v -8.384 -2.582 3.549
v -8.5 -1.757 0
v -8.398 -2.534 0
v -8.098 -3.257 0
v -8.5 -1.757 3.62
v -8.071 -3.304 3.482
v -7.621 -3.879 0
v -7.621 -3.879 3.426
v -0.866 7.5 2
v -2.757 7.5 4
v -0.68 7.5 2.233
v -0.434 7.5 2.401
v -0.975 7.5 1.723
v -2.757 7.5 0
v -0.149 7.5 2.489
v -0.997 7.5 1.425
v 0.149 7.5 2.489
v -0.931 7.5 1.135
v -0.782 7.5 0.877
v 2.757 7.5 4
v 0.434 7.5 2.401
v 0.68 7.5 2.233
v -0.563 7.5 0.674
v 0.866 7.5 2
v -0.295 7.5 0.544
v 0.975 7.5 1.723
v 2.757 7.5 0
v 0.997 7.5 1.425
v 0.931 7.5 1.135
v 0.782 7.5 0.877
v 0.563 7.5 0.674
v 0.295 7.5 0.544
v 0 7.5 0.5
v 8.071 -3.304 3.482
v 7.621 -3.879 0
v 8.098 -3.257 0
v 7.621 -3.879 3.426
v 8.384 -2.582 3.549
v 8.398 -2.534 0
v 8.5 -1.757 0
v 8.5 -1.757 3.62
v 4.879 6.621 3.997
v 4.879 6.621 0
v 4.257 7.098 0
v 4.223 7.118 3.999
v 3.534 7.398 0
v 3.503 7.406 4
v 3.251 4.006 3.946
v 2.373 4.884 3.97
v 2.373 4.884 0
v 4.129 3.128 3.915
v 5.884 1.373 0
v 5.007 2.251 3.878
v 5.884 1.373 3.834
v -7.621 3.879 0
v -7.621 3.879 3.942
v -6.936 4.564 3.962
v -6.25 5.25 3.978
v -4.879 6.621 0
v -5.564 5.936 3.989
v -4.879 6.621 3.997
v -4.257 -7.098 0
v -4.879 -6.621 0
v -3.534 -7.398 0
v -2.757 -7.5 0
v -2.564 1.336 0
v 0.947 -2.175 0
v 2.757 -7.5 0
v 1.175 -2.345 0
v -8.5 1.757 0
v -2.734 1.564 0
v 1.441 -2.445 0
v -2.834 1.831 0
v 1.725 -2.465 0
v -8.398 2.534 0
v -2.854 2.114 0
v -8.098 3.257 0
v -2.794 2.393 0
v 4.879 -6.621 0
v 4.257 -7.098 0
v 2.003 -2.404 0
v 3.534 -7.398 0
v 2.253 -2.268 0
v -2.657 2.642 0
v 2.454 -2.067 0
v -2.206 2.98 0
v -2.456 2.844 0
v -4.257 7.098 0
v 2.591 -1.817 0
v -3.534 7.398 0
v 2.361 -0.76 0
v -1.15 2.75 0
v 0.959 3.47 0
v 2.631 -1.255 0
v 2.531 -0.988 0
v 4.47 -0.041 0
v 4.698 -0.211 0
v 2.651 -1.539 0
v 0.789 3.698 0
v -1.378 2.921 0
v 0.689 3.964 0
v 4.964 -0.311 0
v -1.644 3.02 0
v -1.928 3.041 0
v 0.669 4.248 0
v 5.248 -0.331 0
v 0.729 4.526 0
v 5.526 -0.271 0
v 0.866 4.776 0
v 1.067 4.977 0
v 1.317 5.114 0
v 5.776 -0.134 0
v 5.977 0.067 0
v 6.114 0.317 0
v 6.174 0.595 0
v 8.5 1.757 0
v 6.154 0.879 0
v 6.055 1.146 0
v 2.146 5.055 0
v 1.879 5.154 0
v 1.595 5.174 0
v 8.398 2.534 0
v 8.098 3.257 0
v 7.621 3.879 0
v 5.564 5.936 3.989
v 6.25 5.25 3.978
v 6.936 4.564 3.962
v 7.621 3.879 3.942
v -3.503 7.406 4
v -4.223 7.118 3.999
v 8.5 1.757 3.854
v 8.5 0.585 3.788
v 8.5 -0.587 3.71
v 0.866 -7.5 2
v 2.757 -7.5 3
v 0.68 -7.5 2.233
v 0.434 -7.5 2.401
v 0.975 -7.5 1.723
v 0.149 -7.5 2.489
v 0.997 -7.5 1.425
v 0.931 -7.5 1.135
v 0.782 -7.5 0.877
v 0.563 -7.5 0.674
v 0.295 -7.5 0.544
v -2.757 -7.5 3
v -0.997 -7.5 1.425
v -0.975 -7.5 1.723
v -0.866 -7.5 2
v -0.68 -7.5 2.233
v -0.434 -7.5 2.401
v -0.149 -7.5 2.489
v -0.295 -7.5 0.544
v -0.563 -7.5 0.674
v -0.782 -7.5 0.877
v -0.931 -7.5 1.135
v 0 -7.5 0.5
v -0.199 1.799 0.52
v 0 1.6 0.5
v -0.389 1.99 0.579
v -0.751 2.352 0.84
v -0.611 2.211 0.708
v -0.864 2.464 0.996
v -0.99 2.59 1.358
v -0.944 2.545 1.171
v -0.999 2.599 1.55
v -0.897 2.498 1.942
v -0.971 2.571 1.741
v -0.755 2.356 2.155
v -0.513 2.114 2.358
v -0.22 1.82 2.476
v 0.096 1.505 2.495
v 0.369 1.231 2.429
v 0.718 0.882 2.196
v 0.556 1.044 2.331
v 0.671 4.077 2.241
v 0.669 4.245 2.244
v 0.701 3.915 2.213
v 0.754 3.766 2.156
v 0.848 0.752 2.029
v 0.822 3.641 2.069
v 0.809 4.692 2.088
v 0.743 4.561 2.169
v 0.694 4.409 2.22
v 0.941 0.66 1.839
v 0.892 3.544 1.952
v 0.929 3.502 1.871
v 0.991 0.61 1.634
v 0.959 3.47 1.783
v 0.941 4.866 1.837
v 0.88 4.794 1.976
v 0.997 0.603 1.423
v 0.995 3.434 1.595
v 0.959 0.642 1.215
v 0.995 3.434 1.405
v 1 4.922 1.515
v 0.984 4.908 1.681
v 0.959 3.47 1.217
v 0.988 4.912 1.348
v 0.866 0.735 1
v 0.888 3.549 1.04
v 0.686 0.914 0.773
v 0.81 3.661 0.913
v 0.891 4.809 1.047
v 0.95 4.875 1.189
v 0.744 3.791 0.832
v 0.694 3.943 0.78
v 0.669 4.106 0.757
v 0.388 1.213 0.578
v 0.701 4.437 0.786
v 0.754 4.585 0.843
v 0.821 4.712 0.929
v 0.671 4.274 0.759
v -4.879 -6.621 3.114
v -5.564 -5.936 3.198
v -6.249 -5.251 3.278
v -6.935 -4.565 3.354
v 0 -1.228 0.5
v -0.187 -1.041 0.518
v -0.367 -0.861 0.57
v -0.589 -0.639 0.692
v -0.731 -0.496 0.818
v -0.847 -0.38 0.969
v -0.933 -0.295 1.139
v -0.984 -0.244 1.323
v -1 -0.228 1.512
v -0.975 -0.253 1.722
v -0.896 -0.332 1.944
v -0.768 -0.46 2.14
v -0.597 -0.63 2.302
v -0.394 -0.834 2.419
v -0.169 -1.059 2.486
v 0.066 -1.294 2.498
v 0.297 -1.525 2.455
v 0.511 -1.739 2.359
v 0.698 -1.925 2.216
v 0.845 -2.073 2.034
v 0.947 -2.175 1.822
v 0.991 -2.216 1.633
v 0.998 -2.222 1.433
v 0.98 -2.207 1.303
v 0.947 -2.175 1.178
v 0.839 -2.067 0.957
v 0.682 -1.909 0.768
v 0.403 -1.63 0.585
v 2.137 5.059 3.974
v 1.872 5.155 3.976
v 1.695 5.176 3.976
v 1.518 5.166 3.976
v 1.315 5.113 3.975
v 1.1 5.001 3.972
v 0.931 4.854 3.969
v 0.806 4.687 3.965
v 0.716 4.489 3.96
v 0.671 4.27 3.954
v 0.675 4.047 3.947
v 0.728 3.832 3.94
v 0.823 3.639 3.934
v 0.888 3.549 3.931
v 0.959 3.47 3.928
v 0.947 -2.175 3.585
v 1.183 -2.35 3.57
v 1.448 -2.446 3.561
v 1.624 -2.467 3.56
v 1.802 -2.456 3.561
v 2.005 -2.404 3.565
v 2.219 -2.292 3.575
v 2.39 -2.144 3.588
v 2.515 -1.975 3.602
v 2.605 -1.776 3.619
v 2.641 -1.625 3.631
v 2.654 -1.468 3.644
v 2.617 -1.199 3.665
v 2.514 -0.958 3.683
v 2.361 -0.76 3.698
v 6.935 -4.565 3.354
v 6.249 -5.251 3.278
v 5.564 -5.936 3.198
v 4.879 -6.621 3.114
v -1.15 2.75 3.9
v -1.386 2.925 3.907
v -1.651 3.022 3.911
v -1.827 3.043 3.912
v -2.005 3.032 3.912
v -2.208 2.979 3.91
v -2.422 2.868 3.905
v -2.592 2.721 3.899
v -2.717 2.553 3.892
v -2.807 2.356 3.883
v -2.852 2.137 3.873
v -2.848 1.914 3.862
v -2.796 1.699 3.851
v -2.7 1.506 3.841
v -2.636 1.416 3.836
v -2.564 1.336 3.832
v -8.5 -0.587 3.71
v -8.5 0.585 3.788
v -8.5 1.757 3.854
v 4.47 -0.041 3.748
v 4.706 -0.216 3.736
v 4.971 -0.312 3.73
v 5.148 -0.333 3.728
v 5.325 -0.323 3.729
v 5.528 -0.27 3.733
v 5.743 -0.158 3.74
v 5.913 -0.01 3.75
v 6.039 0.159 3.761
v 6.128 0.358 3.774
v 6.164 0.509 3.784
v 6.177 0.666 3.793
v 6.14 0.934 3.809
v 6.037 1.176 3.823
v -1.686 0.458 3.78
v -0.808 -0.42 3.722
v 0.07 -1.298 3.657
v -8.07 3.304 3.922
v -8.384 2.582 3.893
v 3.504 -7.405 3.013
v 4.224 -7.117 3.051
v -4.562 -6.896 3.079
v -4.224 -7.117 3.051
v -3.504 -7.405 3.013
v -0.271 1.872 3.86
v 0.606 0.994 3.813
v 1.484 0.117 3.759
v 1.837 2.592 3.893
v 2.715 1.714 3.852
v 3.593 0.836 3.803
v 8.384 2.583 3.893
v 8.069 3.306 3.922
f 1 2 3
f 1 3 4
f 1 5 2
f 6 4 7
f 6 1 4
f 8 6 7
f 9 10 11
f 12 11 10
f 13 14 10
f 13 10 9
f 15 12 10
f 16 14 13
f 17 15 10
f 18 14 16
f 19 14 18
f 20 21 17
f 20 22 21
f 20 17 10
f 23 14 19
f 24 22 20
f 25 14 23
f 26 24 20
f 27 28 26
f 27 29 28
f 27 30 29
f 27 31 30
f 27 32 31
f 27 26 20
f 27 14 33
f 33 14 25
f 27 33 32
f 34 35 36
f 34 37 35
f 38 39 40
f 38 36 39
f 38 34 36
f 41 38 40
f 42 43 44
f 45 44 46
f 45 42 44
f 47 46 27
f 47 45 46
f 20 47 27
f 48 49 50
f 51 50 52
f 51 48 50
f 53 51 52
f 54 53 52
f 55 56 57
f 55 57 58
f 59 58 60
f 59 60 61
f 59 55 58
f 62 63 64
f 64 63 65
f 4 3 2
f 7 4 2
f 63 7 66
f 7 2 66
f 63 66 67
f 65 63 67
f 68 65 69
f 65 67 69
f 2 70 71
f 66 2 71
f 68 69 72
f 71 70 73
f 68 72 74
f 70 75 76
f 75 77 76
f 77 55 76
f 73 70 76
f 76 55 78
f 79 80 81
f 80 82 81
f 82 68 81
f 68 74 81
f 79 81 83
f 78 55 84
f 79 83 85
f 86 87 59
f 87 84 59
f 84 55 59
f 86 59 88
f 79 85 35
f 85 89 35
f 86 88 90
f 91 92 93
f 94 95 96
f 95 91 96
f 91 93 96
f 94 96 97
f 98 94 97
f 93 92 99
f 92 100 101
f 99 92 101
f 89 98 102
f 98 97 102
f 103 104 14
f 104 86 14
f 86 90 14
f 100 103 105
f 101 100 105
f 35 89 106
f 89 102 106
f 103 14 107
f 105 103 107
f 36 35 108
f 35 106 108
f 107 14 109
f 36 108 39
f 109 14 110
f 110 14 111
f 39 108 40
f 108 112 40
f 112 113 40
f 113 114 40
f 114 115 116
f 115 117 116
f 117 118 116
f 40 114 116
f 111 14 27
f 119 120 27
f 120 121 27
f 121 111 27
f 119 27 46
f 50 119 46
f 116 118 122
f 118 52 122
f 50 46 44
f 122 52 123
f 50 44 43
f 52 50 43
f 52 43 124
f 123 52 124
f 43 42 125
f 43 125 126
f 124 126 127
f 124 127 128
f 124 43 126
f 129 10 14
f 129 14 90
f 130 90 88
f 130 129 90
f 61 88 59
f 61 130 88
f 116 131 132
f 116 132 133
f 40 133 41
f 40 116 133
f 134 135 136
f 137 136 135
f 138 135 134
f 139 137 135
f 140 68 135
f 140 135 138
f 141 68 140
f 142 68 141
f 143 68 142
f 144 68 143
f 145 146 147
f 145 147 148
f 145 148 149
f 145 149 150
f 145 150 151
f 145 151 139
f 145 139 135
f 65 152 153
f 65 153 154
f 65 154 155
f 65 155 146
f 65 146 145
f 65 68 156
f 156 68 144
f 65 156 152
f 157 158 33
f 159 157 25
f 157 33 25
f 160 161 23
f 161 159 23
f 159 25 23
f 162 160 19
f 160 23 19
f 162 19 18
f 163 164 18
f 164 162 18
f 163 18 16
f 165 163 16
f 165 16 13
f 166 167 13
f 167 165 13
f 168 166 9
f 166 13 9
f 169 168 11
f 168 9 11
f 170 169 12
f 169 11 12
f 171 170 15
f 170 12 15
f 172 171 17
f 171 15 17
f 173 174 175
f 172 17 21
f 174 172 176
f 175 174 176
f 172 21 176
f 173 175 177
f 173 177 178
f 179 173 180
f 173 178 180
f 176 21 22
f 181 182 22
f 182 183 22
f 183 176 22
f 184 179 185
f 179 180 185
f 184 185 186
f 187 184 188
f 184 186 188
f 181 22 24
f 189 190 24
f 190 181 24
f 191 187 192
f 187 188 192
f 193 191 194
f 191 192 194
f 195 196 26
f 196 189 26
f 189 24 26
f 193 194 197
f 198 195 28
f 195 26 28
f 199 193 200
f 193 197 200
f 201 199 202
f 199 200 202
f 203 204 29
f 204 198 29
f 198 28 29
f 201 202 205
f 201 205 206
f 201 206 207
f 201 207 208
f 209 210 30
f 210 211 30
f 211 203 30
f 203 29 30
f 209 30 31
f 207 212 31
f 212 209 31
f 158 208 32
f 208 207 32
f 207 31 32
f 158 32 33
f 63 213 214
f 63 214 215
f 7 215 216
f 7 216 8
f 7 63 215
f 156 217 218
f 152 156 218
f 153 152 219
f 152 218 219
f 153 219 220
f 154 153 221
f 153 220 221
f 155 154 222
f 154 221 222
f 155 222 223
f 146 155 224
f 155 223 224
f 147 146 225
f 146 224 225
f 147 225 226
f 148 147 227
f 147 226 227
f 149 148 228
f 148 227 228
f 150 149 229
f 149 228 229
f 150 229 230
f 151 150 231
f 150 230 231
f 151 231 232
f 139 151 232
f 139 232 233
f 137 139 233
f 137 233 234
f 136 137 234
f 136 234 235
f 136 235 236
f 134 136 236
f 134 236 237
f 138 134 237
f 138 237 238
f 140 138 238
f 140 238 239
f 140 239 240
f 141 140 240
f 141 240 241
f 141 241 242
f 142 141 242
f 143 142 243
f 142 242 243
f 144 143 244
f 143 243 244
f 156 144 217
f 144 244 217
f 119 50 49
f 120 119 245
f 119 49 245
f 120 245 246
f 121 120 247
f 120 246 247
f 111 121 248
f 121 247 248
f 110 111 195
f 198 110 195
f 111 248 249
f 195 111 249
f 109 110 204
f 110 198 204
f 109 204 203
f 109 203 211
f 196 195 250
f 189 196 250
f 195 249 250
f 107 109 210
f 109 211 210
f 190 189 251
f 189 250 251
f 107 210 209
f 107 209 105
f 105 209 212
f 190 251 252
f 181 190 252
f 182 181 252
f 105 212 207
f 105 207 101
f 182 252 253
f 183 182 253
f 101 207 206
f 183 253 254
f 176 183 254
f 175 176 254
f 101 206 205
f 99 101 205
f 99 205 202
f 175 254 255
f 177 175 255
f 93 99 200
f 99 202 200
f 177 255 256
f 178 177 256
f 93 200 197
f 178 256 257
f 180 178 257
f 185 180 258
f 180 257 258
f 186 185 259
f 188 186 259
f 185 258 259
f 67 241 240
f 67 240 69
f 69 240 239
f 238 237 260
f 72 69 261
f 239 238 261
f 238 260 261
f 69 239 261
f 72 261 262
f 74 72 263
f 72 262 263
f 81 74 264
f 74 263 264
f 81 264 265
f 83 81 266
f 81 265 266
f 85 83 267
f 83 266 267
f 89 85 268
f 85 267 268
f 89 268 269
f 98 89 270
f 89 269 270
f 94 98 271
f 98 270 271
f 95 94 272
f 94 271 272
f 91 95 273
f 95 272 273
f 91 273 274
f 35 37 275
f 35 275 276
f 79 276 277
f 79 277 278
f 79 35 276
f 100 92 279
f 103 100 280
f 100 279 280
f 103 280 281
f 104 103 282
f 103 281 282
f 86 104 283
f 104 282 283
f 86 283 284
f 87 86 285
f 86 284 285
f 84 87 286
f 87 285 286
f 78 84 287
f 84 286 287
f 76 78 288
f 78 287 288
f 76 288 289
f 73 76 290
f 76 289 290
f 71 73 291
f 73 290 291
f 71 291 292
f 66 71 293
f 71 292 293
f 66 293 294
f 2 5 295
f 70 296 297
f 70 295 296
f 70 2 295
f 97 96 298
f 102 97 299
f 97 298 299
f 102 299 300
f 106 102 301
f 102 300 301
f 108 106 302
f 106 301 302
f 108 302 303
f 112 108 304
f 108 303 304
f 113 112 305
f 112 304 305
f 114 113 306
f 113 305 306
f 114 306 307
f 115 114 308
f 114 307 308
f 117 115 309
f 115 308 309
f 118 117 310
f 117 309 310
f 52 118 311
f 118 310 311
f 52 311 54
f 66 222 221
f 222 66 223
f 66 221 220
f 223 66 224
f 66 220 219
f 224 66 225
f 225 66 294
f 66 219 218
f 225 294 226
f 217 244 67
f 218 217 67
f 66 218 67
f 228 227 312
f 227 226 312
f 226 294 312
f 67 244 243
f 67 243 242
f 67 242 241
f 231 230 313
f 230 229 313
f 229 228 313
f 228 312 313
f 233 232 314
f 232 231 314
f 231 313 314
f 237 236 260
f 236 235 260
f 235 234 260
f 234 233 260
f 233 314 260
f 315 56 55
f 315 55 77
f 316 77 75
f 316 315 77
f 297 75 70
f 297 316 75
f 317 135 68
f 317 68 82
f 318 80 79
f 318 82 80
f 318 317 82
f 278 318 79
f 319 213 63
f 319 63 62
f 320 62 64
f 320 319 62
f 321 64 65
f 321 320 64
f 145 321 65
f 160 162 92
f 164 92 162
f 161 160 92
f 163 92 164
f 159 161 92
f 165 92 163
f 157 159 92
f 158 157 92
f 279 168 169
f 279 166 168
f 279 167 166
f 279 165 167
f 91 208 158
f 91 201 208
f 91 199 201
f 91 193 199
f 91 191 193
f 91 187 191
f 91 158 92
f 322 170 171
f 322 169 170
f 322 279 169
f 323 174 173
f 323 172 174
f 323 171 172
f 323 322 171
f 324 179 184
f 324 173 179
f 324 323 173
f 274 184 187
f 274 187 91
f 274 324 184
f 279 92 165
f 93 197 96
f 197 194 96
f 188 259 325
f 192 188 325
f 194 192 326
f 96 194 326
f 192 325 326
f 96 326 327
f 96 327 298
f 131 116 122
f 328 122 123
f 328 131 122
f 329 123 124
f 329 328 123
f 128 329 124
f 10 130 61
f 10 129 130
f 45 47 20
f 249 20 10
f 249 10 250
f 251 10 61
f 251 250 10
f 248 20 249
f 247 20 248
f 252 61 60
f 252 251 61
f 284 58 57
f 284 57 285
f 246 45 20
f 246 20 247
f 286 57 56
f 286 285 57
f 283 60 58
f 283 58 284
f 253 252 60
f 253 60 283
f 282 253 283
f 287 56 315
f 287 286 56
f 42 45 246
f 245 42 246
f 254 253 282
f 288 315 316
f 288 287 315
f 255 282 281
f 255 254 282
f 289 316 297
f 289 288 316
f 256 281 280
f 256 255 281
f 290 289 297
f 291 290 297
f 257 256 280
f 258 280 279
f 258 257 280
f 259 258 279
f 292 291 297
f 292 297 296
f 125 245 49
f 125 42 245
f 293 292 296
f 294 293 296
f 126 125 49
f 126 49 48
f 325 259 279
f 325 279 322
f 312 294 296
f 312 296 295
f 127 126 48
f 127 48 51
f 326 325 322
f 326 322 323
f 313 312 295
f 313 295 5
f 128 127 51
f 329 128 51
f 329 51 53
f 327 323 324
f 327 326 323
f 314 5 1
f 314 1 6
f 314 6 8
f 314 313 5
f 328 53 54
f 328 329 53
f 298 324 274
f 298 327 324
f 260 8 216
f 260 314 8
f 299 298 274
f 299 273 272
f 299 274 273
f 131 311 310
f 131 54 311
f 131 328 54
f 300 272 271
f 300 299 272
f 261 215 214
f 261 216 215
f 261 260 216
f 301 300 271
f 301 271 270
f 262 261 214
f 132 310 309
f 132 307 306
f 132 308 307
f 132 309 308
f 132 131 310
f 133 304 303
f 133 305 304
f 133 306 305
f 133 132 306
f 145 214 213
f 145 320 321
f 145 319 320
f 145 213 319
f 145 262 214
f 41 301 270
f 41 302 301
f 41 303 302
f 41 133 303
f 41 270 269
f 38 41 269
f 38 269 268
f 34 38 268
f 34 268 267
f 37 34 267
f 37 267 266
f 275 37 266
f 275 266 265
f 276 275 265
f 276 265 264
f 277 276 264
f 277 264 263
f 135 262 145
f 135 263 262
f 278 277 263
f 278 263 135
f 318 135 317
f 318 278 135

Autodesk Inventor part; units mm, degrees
ref_plane "YZ Plane" through (0, 0, 0) normal (1, 0, 0) x (0, 1, 0)
ref_plane "XZ Plane" through (0, 0, 0) normal (0, 1, 0) x (-1, 0, 0)
ref_plane "XY Plane" through (0, 0, 0) normal (0, 0, 1) x (1, 0, 0)
sketch "Base" plane through (0, 0, 0) normal (0, 0, 1) x (1, 0, 0)
  line L0 (-8.5, -3) -> (-8.5, 3)
  line L1 (-8.5, 3) -> (-4, 7.5)
  line L2 (-4, 7.5) -> (4, 7.5)
  line L3 (4, 7.5) -> (8.5, 3)
  line L4 (8.5, 3) -> (8.5, -3)
  line L5 (8.5, -3) -> (4, -7.5)
  line L6 (4, -7.5) -> (-4, -7.5)
  line L7 (-4, -7.5) -> (-8.5, -3)
  line L8 (-8.5, 0) -> (8.5, 0) construction
  line L9 (0, 7.5) -> (0, -7.5) construction
  point P0 (0, 0)
  point P1 (0, 0)
  dimension "d1" = 17
  dimension "d5" = 15
  dimension "d7" = 6
extrude "BaseFeature" add sketch "Base" along normal blind 4
fillet "BaseFilletsFeature" radius 3 8 edges at (-8.5, -3, 2) (-4, -7.5, 2) (4, -7.5, 2) (8.5, -3, 2) (8.5, 3, 2) (4, 7.5, 2) (-4, 7.5, 2) (-8.5, 3, 2)
sketch "RailHoles" plane through (0, 0, 4) normal (0, 0, 1) x (1, 0, 0)
  line L0 (1.6663, 4.1769) -> (5.1769, 0.6663) construction
  line L1 (-1.8568, 2.0431) -> (1.6538, -1.4675) construction
  line L2 (7.6213, 3.8787) -> (4.8787, 6.6213) construction
  line L3 (6.25, 5.25) -> (3.4216, 2.4216) construction
  circle A0 centre (1.6663, 4.1769) radius 1
  circle A1 centre (5.1769, 0.6663) radius 1
  circle A2 centre (-1.8568, 2.0431) radius 1
  circle A3 centre (1.6538, -1.4675) radius 1
  line L4 (2.3734, 4.884) -> (5.884, 1.3734)
  line L5 (0.9592, 3.4698) -> (4.4698, -0.0408)
  line L6 (-1.1497, 2.7502) -> (2.3609, -0.7604)
  line L7 (-2.5639, 1.336) -> (0.9467, -2.1746)
  dimension "d11" = 4
  dimension "d12" = 4
  dimension "d13" = 4.9647
  dimension "d14" = 2
  dimension "d15" = 1.5
  dimension "d25" = 3.8787
extrude "RailHolesFeature" cut sketch "RailHoles" against normal through all
sketch "RouteHole" plane through (-2.7574, -7.5, 0) normal (0, -1, 0) x (1, 0, 0)
  line L0 (5.5147, 4) -> (5.5147, 0) construction
  line L1 (0, 4) -> (5.5147, 4) construction
  line L2 (0, 0) -> (0, 4) construction
  line L3 (5.5147, 0) -> (0, 0) construction
  line L4 (0, 4) -> (0, 0) construction
  line L5 (0, 4) -> (5.5147, 4) construction
  line L6 (2.7574, 4) -> (2.7574, 0) construction
  line L7 (5.5147, 0) -> (0, 0) construction
  circle A0 centre (2.7574, 1.5) radius 1.25
  dimension "d40" = 2.5
  dimension "d41" = 1.5
hole "RouteHoleFeature" at (0, -7.5, 1.5) direction (0, 1, 0) diameter 2 end through all
sketch "SideProfile" plane through (8.5, -1.7574, 0) normal (1, 0, 0) x (0, 0, -1)
  arc A0 (-4, 9.2574) -> (-3, -5.7426) centre (109, 9.2574) ccw
  line L0 (-4, -5.7426) -> (0, -5.7426) construction
  line L1 (0, 9.2574) -> (-4, 9.2574) construction
  line L2 (-3, -5.7426) -> (0, -5.7426)
  line L3 (0, 9.2574) -> (0, -5.7426)
  line L4 (0, 9.2574) -> (0, 8.3787) projected
  line L5 (0, 9.2574) -> (-4, 9.2574)
  line L6 (-4, -2.1213) -> (-4, 0) construction
  dimension "d36" = 4
  dimension "d39" = 3
extrude "SideProfileFeature" cut sketch "SideProfile" against normal through all keep common part
equation "\"d7\" = 0.4 * d5"
equation "\"d12\" = 2 * d14"
equation "\"d13\" = 1.28 * d25"
properties part number "MiddleRouter"
